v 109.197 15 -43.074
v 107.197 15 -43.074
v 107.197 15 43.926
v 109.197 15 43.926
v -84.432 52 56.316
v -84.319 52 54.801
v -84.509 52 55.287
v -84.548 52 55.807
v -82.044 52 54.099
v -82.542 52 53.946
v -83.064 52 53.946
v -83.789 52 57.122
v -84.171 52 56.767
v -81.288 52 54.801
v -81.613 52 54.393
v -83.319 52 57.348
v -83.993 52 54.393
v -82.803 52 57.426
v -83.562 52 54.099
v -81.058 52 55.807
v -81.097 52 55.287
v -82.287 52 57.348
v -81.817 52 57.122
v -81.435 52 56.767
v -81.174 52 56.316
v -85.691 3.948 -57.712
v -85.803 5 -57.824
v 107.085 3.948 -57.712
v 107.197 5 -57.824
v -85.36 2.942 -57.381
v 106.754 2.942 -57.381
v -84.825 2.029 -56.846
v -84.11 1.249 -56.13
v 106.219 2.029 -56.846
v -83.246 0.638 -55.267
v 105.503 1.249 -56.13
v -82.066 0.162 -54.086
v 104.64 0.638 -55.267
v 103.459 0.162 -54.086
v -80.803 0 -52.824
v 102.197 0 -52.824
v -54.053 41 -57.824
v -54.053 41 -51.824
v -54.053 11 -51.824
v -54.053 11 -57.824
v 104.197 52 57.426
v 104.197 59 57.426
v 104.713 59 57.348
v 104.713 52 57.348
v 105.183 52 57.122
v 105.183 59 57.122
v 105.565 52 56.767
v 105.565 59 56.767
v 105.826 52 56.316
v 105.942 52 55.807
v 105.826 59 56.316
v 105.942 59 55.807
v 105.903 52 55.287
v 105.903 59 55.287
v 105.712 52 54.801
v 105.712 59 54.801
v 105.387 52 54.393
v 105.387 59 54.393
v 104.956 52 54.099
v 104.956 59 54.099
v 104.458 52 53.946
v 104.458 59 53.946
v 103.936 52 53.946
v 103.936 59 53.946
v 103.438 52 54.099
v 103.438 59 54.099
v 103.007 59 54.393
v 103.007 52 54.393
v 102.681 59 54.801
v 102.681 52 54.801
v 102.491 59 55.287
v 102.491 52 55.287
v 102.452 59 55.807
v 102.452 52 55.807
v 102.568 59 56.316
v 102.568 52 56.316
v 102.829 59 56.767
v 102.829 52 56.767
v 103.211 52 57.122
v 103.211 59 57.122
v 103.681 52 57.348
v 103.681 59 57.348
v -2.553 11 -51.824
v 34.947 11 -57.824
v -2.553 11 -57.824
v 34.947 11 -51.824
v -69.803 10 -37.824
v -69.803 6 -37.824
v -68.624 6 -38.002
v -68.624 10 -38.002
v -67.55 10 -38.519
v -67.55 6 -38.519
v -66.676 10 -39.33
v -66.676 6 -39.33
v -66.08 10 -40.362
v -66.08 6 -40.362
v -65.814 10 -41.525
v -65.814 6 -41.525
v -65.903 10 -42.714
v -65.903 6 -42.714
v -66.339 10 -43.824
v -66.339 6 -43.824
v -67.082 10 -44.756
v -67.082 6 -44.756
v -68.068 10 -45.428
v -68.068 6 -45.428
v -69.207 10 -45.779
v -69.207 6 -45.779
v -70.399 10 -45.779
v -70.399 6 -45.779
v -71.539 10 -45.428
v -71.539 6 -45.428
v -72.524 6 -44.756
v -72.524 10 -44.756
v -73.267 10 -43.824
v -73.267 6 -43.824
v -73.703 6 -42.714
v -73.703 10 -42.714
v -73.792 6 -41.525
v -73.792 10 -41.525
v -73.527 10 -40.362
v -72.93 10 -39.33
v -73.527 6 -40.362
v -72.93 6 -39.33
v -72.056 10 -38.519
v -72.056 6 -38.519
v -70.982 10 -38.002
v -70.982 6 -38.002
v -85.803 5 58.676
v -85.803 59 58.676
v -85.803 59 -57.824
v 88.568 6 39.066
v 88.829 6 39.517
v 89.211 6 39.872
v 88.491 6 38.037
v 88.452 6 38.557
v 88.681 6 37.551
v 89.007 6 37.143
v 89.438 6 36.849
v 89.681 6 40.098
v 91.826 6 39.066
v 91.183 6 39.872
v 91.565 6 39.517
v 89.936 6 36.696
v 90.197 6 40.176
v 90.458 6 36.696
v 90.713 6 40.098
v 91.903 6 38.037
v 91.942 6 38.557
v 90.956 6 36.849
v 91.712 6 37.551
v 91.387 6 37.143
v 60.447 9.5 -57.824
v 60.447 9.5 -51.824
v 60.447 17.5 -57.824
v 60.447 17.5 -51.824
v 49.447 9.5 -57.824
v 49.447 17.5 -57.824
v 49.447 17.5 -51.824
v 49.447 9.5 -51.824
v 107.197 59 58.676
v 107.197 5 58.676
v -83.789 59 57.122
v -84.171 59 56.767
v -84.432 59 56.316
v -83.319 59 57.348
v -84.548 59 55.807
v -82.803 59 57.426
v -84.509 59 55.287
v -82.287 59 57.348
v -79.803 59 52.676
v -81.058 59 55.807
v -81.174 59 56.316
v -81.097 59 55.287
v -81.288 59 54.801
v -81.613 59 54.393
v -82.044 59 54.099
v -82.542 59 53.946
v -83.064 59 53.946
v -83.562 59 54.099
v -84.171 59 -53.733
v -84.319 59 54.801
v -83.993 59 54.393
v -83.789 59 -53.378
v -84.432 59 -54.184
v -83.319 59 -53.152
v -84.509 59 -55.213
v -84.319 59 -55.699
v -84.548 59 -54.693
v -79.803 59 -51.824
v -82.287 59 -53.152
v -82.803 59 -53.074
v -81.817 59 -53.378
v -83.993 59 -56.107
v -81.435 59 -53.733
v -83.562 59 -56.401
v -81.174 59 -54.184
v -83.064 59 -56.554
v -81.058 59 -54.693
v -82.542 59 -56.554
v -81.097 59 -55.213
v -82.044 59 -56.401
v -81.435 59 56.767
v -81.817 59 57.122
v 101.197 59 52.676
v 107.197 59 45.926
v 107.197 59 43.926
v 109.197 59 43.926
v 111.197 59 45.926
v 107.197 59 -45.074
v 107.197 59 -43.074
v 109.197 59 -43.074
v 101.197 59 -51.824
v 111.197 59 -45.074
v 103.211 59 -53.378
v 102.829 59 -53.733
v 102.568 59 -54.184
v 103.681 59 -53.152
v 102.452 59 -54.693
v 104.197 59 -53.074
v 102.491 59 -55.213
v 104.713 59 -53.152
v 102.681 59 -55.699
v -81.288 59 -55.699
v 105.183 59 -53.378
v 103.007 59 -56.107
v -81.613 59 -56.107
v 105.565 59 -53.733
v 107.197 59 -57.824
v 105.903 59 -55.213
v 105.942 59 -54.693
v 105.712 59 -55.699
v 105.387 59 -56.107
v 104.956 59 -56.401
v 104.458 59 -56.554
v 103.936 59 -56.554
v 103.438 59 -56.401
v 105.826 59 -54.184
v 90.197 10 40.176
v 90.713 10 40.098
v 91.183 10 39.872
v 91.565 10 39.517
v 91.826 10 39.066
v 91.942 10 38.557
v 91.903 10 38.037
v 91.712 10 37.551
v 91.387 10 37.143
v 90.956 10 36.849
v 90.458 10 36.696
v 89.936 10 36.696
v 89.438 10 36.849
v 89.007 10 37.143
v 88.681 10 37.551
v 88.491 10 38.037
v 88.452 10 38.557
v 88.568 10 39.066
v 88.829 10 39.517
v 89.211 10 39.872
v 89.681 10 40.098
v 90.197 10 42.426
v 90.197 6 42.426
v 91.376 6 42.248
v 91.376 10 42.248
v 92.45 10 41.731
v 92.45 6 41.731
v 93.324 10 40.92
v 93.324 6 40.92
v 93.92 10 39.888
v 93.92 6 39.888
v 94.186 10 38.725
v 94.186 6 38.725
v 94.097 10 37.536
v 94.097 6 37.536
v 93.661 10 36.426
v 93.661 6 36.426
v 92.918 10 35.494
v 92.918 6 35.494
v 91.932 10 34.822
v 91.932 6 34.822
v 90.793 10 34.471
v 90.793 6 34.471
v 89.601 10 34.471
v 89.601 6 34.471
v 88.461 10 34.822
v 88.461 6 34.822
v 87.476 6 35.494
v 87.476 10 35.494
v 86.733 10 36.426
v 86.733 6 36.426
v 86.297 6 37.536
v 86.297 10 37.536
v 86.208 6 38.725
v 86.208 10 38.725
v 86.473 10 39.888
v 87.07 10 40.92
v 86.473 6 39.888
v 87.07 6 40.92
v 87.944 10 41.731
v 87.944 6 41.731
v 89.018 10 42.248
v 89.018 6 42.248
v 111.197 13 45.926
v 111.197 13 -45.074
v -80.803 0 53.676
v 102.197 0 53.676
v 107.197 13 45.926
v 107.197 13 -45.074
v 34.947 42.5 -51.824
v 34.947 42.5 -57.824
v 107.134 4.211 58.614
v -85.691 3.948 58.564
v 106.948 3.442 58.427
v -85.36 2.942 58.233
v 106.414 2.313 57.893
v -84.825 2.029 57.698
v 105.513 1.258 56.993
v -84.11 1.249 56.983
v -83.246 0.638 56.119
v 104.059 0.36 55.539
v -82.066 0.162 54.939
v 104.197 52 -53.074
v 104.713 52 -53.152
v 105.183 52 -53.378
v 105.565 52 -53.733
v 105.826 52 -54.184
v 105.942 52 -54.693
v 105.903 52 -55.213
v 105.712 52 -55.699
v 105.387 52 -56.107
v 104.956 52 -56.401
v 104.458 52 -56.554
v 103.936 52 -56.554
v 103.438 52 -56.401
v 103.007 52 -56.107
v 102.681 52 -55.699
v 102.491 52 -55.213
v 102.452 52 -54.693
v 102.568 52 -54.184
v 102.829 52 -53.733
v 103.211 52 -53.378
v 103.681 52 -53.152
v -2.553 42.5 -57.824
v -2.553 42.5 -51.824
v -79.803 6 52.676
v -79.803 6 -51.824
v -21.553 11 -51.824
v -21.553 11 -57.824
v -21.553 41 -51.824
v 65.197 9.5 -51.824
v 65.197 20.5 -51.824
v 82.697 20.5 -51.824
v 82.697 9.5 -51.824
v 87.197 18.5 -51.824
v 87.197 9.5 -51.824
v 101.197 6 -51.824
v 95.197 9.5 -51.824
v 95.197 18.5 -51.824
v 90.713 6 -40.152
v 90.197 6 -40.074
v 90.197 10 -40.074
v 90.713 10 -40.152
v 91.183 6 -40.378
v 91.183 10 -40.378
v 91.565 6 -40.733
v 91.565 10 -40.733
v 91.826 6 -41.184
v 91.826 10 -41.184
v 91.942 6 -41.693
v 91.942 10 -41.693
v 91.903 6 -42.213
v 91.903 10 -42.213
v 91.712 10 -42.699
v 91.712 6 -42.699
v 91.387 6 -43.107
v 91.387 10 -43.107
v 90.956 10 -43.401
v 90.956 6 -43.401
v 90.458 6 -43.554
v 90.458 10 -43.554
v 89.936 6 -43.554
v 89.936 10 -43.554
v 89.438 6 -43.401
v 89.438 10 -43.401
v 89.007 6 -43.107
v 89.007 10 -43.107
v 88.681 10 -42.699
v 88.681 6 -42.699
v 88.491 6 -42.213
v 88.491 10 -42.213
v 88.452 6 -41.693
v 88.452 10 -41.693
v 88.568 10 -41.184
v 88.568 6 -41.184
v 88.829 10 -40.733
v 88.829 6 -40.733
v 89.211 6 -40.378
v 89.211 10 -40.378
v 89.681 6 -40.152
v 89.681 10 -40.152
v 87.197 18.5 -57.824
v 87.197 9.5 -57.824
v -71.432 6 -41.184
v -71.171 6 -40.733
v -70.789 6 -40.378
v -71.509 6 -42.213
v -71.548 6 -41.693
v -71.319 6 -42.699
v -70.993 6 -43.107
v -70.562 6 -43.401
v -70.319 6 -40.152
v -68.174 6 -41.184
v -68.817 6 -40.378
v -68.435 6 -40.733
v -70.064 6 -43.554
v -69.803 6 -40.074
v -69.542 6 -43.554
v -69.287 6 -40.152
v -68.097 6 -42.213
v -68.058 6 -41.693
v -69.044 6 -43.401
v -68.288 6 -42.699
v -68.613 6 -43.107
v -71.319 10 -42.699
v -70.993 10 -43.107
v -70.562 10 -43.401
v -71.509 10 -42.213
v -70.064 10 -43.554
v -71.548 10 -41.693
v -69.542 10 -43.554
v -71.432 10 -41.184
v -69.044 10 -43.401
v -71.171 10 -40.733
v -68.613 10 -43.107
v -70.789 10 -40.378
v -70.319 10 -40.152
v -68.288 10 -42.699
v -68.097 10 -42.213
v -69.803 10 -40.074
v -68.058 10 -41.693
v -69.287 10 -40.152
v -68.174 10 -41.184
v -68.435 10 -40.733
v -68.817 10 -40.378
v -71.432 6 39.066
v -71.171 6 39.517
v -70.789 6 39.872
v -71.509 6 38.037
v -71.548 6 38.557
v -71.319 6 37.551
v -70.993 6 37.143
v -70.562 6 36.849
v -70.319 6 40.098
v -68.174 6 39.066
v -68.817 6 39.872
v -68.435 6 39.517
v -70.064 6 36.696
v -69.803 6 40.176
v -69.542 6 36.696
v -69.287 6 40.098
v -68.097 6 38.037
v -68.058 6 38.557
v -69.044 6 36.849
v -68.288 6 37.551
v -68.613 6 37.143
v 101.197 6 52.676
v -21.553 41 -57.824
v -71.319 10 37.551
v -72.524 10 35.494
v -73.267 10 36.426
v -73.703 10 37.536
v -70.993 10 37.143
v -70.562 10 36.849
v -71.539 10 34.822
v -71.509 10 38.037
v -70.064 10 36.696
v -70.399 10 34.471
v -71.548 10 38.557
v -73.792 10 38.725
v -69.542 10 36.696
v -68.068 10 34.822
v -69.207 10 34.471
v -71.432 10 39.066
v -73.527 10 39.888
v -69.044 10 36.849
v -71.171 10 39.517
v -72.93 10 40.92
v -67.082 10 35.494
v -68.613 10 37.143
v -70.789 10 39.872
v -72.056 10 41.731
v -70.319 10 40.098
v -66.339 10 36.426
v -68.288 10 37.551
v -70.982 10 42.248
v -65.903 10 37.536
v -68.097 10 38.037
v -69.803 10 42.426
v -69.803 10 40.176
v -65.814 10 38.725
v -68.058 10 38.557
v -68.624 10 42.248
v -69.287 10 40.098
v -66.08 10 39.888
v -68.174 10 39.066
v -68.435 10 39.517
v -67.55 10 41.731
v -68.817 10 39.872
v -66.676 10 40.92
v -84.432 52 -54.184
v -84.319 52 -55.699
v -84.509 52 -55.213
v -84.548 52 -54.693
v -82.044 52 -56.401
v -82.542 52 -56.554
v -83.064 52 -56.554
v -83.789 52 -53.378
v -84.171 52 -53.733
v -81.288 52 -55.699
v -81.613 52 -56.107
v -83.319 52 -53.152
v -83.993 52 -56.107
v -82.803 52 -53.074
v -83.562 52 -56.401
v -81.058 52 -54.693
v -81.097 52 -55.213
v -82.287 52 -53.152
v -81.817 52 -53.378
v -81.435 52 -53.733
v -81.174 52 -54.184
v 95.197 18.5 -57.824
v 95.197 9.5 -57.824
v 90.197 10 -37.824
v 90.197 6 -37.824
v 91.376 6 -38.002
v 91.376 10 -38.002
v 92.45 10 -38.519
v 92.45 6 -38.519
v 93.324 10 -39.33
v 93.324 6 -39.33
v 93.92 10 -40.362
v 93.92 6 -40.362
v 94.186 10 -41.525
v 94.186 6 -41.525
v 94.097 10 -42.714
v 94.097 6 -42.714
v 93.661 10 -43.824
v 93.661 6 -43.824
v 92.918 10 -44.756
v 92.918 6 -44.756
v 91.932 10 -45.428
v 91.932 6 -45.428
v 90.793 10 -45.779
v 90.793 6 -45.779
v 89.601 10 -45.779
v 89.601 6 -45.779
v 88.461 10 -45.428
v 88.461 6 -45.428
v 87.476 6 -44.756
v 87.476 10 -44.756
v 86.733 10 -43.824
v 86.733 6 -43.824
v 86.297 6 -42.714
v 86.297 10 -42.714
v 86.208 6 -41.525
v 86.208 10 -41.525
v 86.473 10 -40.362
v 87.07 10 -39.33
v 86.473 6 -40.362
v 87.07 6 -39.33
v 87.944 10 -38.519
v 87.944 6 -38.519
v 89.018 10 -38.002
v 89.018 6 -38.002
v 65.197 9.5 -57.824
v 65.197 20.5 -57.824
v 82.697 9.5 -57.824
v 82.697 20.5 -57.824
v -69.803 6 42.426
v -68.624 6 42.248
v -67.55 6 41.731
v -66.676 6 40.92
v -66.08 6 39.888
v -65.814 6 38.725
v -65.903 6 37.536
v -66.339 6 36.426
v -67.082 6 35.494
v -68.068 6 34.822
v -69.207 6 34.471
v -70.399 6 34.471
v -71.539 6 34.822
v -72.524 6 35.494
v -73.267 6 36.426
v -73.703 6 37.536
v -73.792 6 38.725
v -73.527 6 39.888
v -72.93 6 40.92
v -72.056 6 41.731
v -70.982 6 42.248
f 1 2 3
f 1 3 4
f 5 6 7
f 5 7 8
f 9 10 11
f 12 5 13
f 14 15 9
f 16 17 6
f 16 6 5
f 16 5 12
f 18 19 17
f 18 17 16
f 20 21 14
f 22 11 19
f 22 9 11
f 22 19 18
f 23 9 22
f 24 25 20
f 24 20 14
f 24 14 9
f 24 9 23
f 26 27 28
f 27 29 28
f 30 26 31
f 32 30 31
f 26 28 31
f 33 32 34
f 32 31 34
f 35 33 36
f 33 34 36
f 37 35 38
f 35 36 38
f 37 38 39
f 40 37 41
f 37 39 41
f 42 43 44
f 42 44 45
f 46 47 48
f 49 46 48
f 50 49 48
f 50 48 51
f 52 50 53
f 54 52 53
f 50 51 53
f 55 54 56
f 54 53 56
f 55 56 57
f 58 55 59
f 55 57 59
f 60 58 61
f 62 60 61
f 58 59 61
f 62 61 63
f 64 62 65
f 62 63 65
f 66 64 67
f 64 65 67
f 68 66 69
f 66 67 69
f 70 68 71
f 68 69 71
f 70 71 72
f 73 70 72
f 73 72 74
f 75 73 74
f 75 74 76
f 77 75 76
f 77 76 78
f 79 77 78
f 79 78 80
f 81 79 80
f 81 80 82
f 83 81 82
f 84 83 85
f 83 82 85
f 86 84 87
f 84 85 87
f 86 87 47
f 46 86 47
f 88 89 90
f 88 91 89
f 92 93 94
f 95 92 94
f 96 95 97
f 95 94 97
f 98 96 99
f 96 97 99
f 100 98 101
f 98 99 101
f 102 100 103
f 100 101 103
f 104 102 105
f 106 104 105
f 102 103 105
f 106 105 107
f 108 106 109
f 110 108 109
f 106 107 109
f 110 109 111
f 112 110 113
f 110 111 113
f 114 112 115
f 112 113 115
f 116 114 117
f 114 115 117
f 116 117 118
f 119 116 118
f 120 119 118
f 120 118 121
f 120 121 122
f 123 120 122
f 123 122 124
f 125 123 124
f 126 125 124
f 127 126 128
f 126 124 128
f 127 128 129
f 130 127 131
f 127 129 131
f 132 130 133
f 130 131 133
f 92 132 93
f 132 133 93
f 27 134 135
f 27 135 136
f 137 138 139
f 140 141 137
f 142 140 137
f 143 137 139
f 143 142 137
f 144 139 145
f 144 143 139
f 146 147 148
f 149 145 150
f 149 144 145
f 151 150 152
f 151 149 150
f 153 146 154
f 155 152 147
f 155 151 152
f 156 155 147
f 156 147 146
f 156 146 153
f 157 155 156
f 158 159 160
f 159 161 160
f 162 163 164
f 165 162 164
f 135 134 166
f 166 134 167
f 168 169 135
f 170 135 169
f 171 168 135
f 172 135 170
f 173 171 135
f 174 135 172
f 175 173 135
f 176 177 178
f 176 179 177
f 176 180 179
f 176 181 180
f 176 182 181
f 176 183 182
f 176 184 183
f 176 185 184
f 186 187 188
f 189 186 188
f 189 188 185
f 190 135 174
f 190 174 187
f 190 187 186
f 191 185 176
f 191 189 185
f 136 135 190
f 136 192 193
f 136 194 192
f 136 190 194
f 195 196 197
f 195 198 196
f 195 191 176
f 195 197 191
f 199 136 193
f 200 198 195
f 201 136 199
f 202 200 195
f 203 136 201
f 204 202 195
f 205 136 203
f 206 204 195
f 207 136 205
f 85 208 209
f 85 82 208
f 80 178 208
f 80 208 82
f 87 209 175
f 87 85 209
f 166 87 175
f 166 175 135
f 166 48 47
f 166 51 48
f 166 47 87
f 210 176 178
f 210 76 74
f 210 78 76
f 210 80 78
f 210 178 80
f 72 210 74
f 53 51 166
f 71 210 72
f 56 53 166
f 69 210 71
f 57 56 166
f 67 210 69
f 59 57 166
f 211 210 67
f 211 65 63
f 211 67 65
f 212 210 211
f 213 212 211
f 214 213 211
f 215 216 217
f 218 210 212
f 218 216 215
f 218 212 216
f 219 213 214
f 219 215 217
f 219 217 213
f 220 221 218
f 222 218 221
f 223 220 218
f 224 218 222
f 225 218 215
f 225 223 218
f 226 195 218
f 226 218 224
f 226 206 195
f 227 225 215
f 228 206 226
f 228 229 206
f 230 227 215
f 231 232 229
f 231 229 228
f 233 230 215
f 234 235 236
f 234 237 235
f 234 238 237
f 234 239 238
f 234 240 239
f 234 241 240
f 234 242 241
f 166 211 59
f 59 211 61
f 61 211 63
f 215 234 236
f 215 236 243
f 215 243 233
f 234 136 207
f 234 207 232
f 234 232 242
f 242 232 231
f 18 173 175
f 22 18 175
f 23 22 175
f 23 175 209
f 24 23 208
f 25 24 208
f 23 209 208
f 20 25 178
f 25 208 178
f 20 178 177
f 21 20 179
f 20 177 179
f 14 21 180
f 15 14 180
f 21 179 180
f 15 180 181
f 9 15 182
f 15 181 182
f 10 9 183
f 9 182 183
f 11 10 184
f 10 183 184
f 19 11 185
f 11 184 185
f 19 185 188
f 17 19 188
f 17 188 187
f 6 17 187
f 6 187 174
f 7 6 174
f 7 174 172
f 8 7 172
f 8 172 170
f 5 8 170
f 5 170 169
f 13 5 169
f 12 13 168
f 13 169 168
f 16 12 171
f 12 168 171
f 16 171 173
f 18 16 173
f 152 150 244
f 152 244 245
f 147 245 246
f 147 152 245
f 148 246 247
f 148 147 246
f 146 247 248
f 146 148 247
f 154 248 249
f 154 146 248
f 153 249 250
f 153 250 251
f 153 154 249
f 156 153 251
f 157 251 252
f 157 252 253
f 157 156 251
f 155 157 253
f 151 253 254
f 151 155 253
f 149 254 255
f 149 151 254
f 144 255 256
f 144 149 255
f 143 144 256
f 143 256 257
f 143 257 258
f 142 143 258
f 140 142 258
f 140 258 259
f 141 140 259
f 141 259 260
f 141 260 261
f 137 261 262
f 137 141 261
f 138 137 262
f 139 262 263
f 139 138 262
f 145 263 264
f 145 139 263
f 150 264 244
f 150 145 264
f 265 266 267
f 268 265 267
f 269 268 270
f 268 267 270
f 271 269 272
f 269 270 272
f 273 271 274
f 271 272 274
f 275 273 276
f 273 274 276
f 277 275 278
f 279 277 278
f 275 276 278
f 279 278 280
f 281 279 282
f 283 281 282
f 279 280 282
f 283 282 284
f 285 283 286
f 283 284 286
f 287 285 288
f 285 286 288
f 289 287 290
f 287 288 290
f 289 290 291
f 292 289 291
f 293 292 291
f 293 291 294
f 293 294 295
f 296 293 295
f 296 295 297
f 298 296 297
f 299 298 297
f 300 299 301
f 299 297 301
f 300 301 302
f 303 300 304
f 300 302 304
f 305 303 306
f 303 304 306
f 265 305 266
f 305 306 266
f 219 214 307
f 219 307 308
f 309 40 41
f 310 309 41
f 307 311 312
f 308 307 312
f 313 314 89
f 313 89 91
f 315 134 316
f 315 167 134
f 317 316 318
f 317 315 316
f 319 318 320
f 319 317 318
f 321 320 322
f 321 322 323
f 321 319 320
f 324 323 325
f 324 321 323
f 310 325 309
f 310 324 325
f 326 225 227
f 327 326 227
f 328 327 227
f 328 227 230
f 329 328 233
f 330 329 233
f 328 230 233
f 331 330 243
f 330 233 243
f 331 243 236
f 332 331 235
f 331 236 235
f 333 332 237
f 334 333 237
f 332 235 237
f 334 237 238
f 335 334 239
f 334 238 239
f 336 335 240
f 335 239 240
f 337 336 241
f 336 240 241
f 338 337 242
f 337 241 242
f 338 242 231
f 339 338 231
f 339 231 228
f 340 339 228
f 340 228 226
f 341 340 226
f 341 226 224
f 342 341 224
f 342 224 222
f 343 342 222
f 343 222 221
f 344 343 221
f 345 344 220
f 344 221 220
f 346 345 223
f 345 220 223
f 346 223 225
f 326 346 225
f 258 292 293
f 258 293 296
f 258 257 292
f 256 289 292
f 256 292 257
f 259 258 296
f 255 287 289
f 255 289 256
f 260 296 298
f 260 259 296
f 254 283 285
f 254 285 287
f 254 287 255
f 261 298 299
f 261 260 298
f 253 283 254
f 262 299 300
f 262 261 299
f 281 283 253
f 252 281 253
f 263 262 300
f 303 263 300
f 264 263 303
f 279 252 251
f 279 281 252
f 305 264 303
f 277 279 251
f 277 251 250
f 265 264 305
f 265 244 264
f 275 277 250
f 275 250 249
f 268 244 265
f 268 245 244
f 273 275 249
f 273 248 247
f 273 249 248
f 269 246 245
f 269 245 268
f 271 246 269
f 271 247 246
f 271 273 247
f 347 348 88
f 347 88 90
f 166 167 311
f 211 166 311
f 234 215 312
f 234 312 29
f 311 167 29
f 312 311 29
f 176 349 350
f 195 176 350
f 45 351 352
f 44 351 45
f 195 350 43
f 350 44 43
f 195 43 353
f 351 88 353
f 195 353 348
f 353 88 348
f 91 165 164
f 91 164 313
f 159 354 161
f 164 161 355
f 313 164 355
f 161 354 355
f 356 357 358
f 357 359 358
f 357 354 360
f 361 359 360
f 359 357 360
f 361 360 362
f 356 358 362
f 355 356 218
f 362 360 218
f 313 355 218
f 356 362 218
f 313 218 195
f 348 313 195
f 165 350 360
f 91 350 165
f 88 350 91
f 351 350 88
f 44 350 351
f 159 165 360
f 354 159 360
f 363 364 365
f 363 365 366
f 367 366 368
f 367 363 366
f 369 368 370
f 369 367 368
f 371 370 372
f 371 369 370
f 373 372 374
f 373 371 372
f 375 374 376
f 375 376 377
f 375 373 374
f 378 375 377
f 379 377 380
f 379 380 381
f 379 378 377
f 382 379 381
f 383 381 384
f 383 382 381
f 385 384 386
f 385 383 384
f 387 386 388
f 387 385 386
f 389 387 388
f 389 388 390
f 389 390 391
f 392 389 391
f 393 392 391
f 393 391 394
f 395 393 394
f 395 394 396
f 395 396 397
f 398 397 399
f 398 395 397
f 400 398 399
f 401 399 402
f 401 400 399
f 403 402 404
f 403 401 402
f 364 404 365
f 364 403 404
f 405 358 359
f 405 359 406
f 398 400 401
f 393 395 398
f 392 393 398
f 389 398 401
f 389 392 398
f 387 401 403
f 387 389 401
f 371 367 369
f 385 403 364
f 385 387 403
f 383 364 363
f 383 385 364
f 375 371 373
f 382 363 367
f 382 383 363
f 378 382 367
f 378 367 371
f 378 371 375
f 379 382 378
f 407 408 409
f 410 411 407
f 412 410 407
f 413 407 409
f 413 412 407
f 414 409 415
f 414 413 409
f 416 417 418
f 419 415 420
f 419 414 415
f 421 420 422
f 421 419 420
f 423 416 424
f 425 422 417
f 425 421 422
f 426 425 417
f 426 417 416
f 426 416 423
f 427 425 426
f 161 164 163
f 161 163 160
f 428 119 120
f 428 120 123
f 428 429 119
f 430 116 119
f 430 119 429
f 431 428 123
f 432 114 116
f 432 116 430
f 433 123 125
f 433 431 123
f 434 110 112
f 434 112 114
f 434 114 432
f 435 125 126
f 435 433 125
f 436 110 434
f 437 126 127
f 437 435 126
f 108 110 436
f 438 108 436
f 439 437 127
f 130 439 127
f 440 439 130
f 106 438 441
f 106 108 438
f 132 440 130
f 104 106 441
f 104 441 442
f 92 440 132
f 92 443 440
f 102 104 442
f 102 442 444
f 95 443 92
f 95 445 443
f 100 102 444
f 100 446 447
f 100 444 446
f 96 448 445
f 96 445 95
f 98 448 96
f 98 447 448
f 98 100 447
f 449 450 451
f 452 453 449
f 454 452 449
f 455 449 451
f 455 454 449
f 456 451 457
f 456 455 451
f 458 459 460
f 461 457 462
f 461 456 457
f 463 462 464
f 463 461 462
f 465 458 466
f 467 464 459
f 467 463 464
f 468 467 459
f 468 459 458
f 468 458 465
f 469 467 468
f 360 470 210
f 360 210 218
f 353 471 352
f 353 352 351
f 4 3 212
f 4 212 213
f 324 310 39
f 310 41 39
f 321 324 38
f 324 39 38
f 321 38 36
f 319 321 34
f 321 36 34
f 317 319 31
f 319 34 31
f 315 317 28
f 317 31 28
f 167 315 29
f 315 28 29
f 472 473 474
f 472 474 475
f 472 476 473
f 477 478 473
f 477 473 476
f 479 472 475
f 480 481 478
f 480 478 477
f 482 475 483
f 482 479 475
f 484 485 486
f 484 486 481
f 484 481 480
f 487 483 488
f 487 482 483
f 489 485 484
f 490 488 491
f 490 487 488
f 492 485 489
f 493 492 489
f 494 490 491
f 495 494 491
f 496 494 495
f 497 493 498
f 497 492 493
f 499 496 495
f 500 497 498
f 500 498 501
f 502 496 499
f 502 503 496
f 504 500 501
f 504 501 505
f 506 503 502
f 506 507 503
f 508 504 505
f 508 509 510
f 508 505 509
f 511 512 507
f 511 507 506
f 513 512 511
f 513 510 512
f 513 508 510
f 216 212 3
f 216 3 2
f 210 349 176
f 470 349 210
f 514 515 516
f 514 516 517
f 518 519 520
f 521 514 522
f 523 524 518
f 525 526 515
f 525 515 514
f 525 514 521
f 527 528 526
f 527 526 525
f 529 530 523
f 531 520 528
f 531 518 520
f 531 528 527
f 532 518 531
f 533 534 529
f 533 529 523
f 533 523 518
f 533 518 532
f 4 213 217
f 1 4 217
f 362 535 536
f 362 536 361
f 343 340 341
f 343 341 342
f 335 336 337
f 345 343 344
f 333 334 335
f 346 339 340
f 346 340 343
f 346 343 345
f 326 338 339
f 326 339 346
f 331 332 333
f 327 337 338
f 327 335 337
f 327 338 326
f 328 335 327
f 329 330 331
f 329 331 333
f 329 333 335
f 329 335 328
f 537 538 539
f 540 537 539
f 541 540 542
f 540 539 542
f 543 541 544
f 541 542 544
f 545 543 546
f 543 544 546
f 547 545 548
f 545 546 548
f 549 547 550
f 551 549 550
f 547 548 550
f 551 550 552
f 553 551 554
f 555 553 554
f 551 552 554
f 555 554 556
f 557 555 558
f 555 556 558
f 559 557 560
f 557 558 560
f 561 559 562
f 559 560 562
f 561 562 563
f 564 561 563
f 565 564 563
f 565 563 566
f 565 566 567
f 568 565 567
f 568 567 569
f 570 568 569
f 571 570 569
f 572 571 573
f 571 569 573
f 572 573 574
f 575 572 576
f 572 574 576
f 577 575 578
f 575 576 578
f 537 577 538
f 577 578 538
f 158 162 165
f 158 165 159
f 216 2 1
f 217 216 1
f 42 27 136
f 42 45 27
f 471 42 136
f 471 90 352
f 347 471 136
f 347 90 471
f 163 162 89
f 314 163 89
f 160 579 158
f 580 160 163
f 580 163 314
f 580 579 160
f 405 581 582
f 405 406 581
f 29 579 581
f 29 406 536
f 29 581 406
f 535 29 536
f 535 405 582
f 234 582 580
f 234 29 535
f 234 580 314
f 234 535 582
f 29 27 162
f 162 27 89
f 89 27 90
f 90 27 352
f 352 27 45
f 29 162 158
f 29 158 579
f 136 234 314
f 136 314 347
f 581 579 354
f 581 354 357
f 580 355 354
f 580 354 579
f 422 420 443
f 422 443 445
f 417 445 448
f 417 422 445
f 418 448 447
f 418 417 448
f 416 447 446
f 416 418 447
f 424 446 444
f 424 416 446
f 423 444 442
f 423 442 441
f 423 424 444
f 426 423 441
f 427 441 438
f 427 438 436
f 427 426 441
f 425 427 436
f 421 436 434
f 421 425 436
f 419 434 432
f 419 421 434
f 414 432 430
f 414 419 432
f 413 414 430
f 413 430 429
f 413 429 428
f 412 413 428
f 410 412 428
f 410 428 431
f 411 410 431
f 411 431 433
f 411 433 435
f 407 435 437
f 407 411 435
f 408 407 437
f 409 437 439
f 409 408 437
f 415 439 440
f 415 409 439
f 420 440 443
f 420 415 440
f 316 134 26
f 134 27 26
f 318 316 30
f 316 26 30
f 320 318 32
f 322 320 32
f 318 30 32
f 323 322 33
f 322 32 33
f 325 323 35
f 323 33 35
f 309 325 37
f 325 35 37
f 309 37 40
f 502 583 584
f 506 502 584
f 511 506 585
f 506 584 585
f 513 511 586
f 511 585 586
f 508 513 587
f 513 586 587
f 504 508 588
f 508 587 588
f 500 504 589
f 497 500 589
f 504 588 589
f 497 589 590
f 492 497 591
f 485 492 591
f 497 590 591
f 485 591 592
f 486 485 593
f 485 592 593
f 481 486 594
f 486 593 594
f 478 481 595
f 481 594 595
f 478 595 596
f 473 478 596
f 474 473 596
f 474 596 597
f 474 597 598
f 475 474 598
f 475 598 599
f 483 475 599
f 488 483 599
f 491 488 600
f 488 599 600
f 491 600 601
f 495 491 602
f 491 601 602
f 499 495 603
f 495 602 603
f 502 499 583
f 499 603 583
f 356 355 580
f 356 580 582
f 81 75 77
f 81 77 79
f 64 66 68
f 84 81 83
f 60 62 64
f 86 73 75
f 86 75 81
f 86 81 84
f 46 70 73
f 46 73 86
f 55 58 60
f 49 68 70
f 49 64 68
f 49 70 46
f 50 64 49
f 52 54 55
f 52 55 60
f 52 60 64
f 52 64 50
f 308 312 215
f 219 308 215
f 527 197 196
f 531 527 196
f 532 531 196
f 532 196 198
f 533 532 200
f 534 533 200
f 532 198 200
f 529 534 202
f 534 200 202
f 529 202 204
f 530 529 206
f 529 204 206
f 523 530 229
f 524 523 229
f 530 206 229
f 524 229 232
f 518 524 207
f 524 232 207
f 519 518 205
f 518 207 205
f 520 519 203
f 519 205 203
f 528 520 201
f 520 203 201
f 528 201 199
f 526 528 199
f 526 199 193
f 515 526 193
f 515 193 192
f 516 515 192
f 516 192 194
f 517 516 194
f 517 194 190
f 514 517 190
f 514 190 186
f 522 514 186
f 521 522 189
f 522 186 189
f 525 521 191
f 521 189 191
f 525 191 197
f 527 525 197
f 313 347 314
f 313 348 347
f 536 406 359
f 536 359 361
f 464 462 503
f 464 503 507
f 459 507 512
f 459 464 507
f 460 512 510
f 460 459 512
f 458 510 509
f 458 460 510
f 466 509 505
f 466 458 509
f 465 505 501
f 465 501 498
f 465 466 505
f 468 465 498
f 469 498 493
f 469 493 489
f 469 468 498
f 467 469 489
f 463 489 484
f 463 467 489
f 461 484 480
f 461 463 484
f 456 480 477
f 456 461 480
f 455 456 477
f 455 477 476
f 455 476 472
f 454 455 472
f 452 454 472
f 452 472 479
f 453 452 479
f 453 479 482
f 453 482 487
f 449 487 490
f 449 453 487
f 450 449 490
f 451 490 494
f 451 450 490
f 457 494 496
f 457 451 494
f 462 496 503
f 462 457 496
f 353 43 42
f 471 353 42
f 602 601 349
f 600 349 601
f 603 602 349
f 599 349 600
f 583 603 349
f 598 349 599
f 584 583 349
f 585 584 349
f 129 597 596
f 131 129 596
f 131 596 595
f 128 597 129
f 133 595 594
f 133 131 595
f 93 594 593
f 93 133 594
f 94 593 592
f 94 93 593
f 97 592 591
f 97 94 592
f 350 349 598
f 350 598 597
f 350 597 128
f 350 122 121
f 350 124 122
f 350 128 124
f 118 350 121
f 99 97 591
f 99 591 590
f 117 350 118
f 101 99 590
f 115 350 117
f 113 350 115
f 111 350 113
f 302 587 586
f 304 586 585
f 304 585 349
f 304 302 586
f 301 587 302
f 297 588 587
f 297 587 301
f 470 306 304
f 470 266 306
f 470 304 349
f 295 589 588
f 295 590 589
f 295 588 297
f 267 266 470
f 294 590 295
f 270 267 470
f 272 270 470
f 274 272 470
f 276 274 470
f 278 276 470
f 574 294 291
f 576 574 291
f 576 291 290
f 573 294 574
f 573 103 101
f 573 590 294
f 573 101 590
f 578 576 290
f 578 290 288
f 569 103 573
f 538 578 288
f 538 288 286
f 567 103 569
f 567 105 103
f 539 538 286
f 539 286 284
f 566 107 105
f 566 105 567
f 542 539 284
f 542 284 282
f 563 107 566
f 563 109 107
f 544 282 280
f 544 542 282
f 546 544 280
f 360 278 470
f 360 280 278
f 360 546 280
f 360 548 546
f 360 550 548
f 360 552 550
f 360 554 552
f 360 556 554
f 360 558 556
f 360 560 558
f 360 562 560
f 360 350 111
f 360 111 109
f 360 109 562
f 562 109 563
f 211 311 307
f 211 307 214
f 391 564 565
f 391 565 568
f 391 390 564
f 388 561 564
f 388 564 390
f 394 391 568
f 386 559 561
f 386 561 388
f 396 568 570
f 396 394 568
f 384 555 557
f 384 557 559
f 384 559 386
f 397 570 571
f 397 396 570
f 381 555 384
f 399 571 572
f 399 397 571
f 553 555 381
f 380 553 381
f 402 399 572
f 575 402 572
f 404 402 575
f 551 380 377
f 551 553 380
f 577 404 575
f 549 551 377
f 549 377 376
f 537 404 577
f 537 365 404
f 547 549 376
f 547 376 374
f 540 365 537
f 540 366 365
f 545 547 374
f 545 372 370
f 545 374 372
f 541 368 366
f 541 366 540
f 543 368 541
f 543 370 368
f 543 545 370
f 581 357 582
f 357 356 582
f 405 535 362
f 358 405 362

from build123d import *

# Parameters (mm, degrees)
SKETCH1_W               = 193
SKETCH1_H               = 116.5
BOSS_EXTRUDE5_DEPTH     = 59
SHELL4_T                = -6
SKETCH6_R               = 4
SKETCH6_R_2             = 1.75
BOSS_EXTRUDE6_DEPTH     = 4
CUT_EXTRUDE1_DEPTH      = 38
CUT_EXTRUDE1_DEPTH_BACK = 34
SKETCH9_R               = 1.75
CUT_EXTRUDE2_DEPTH      = 7
FILLET2_R               = 5
SKETCH12_W              = 6
SKETCH12_H              = 6.5
BOSS_EXTRUDE7_DEPTH     = 18
SKETCH15_W              = 6
SKETCH15_H              = 7.5
BOSS_EXTRUDE8_DEPTH     = 5
SKETCH16_W              = 7.5
SKETCH16_H              = 6
SKETCH16_W_2            = 6.75
SKETCH16_W_3            = 3.5
BOSS_EXTRUDE9_DEPTH     = 7.5
SKETCH17_W              = 6
SKETCH17_H              = 31.5
BOSS_EXTRUDE10_DEPTH    = 4
SKETCH18_W              = 6
SKETCH18_H              = 1.5
BOSS_EXTRUDE11_DEPTH    = 1.5
SKETCH19_W              = 2
SKETCH19_H              = 6
BOSS_EXTRUDE12_DEPTH    = 30
SKETCH20_W              = 9
SKETCH20_H              = 2.5
BOSS_EXTRUDE13_DEPTH    = 6
SKETCH21_W              = 6
SKETCH21_H              = 7.5
CUT_EXTRUDE3_DEPTH      = 3
SKETCH22_W              = 17.5
SKETCH22_H              = 6
CUT_EXTRUDE4_DEPTH      = 2
SKETCH23_W              = 6
SKETCH23_H              = 5
CUT_EXTRUDE5_DEPTH      = 2
SKETCH24_W              = 11
SKETCH24_H              = 6
CUT_EXTRUDE6_DEPTH      = 1.5
SKETCH25_W              = 11
SKETCH25_H              = 6
CUT_EXTRUDE7_DEPTH      = 1.5
SKETCH27_W              = 17.5
SKETCH27_H              = 6
CUT_EXTRUDE8_DEPTH      = 1.5
SKETCH32_W              = 91
SKETCH32_H              = 46
BOSS_EXTRUDE15_DEPTH    = 4
SKETCH33_W              = 2
SKETCH33_H              = 87
CUT_EXTRUDE10_DEPTH     = 44
SKETCH34_W              = 8
SKETCH34_H              = 6
CUT_EXTRUDE11_DEPTH     = 1.5
SKETCH35_W              = 6
SKETCH35_H              = 30
BOSS_EXTRUDE16_DEPTH    = 11
SKETCH36_W              = 6
SKETCH36_H              = 30
BOSS_EXTRUDE17_DEPTH    = 7
SKETCH37_W              = 6
SKETCH37_H              = 31.5
BOSS_EXTRUDE18_DEPTH    = 6
SKETCH38_W              = 6
SKETCH38_H              = 31.5
BOSS_EXTRUDE19_DEPTH    = 7


with BuildPart() as part:
    # Sketch1 → Boss-Extrude5 (new body)
    with BuildSketch(Plane(origin=(0, 0, 0), x_dir=(1, 0, 0), z_dir=(0, 1, 0))):
        with Locations((10.696891192, -0.426165803)):
            Rectangle(SKETCH1_W, SKETCH1_H)
    extrude(amount=BOSS_EXTRUDE5_DEPTH)

    # Shell4
    shell4_openings = [part.faces().sort_by_distance(p)[0] for p in [
        (10.696891192, 59, 0.426165803),
    ]]
    offset(amount=SHELL4_T, openings=shell4_openings, kind=Kind.INTERSECTION)

    # Sketch6 → Boss-Extrude6 (add)
    # profile 1 of 4: a face of its own
    with BuildSketch(Plane(origin=(0, 6, 0), x_dir=(1, 0, 0), z_dir=(0, 1, 0))):
        with Locations(Location((-69.803108808, 41.823834197, 0), (0, 0, 270))):
            Circle(SKETCH6_R)
        with Locations(Location((-69.803108808, 41.823834197, 0), (0, 0, 270))):
            Circle(SKETCH6_R_2, mode=Mode.SUBTRACT)
    # profile 2 of 4: a face of its own
    with BuildSketch(Plane(origin=(0, 6, 0), x_dir=(1, 0, 0), z_dir=(0, 1, 0))):
        with Locations(Location((90.196891192, 41.823834197, 0), (0, 0, 270))):
            Circle(SKETCH6_R)
        with Locations(Location((90.196891192, 41.823834197, 0), (0, 0, 270))):
            Circle(SKETCH6_R_2, mode=Mode.SUBTRACT)
    # profile 3 of 4: a face of its own
    with BuildSketch(Plane(origin=(0, 6, 0), x_dir=(1, 0, 0), z_dir=(0, 1, 0))):
        with Locations(Location((90.196891192, -38.426165803, 0), (0, 0, 270))):
            Circle(SKETCH6_R)
        with Locations(Location((90.196891192, -38.426165803, 0), (0, 0, 270))):
            Circle(SKETCH6_R_2, mode=Mode.SUBTRACT)
    # profile 4 of 4: a face of its own
    with BuildSketch(Plane(origin=(0, 6, 0), x_dir=(1, 0, 0), z_dir=(0, 1, 0))):
        with Locations(Location((-69.803108808, -38.426165803, 0), (0, 0, 270))):
            Circle(SKETCH6_R)
        with Locations(Location((-69.803108808, -38.426165803, 0), (0, 0, 270))):
            Circle(SKETCH6_R_2, mode=Mode.SUBTRACT)
    extrude(amount=BOSS_EXTRUDE6_DEPTH)

    # Sketch8 → Cut-Extrude1 (cut, two sides: drawn at the far end of the back side and taken through both)
    with BuildSketch(Plane(origin=(0, 0, -57.823834197), x_dir=(-1, 0, 0), z_dir=(0, 0, -1)).offset(-CUT_EXTRUDE1_DEPTH_BACK)):
        Polygon((-85.946891192, 18.5), (-100.196891192, 18.5), (-100.196891192, 11), (-85.946891192, 11), (-63.946891192, 11), (-45.946891192, 11), (10.053108808, 11), (61.053108808, 11), (61.053108808, 41), (10.053108808, 41), (10.053108808, 42.5), (-45.946891192, 42.5), (-45.946891192, 25), (-63.946891192, 25), (-63.946891192, 18.5), align=None)
    extrude(amount=CUT_EXTRUDE1_DEPTH + CUT_EXTRUDE1_DEPTH_BACK, mode=Mode.SUBTRACT)

    # Sketch9 → Cut-Extrude2 (cut)
    with BuildSketch(Plane(origin=(0, 59, 0), x_dir=(1, 0, 0), z_dir=(0, 1, 0))):
        with Locations(Location((-82.803108808, 54.823834197, 0), (0, 0, 270))):
            Circle(SKETCH9_R)
        with Locations(Location((104.196891192, 54.823834197, 0), (0, 0, 270))):
            Circle(SKETCH9_R)
        with Locations(Location((-82.803108808, -55.676165803, 0), (0, 0, 270))):
            Circle(SKETCH9_R)
        with Locations(Location((104.196891192, -55.676165803, 0), (0, 0, 270))):
            Circle(SKETCH9_R)
    extrude(amount=-CUT_EXTRUDE2_DEPTH, mode=Mode.SUBTRACT)

    # Fillet2
    fillet2_edges = [part.edges().sort_by_distance(p)[0] for p in [
        (10.696891192, 0, -57.823834197),
        (107.196891192, 0, 0.426165803),
        (10.696891192, 0, 58.676165803),
        (-85.803108808, 0, 0.426165803),
    ]]
    fillet(fillet2_edges, radius=FILLET2_R)

    # Sketch12 → Boss-Extrude7 (add)
    with BuildSketch(Plane.ZY.offset(-63.946891192)):
        with Locations((-54.823834197, 21.75)):
            Rectangle(SKETCH12_W, SKETCH12_H)
    extrude(amount=BOSS_EXTRUDE7_DEPTH)

    # Sketch15 → Boss-Extrude8 (add)
    with BuildSketch(Plane.ZY.offset(-100.196891192)):
        with Locations((-54.823834197, 14.75)):
            Rectangle(SKETCH15_W, SKETCH15_H)
    extrude(amount=BOSS_EXTRUDE8_DEPTH)

    # Sketch16 → Boss-Extrude9 (add)
    with BuildSketch(Plane.XZ.offset(-18.5)):
        with Locations((83.446891192, -54.823834197)):
            Rectangle(SKETCH16_W, SKETCH16_H)
        with Locations((61.821891192, -54.823834197)):
            Rectangle(SKETCH16_W_2, SKETCH16_H)
        with Locations((47.696891192, -54.823834197)):
            Rectangle(SKETCH16_W_3, SKETCH16_H)
    extrude(amount=BOSS_EXTRUDE9_DEPTH)

    # Sketch17 → Boss-Extrude10 (add)
    with BuildSketch(Plane.ZY.offset(-45.946891192)):
        with Locations((-54.823834197, 26.75)):
            Rectangle(SKETCH17_W, SKETCH17_H)
    extrude(amount=BOSS_EXTRUDE10_DEPTH)

    # Sketch18 → Boss-Extrude11 (add)
    with BuildSketch(Plane(origin=(-10.053108808, 0, 0), x_dir=(0, 0, -1), z_dir=(1, 0, 0))):
        with Locations((54.823834197, 41.75)):
            Rectangle(SKETCH18_W, SKETCH18_H)
    extrude(amount=BOSS_EXTRUDE11_DEPTH)

    # Sketch19 → Boss-Extrude12 (add)
    with BuildSketch(Plane.XZ.offset(-41)):
        with Locations((-9.553108808, -54.823834197)):
            Rectangle(SKETCH19_W, SKETCH19_H)
    extrude(amount=BOSS_EXTRUDE12_DEPTH)

    # Sketch20 → Boss-Extrude13 (add)
    with BuildSketch(Plane(origin=(0, 0, -57.823834197), x_dir=(-1, 0, 0), z_dir=(0, 0, -1))):
        with Locations((-53.946891192, 17.25)):
            Rectangle(SKETCH20_W, SKETCH20_H)
    extrude(amount=-BOSS_EXTRUDE13_DEPTH)

    # Sketch21 → Cut-Extrude3 (cut)
    with BuildSketch(Plane.ZY.offset(-79.696891192)):
        with Locations((-54.823834197, 14.75)):
            Rectangle(SKETCH21_W, SKETCH21_H)
    extrude(amount=-CUT_EXTRUDE3_DEPTH, mode=Mode.SUBTRACT)

    # Sketch22 → Cut-Extrude4 (cut)
    with BuildSketch(Plane.XZ.offset(-18.5)):
        with Locations((73.946891192, -54.823834197)):
            Rectangle(SKETCH22_W, SKETCH22_H)
    extrude(amount=-CUT_EXTRUDE4_DEPTH, mode=Mode.SUBTRACT)

    # Sketch23 → Cut-Extrude5 (cut)
    with BuildSketch(Plane.ZY.offset(-58.446891192)):
        with Locations((-54.823834197, 13.5)):
            Rectangle(SKETCH23_W, SKETCH23_H)
    extrude(amount=-CUT_EXTRUDE5_DEPTH, mode=Mode.SUBTRACT)

    # Sketch24 → Cut-Extrude6 (cut)
    with BuildSketch(Plane.XZ.offset(-16)):
        with Locations((54.946891192, -54.823834197)):
            Rectangle(SKETCH24_W, SKETCH24_H)
    extrude(amount=-CUT_EXTRUDE6_DEPTH, mode=Mode.SUBTRACT)

    # Sketch25 → Cut-Extrude7 (cut)
    with BuildSketch(Plane(origin=(0, 11, 0), x_dir=(1, 0, 0), z_dir=(0, 1, 0))):
        with Locations((54.946891192, 54.823834197)):
            Rectangle(SKETCH25_W, SKETCH25_H)
    extrude(amount=-CUT_EXTRUDE7_DEPTH, mode=Mode.SUBTRACT)

    # Sketch27 → Cut-Extrude8 (cut)
    with BuildSketch(Plane(origin=(0, 11, 0), x_dir=(1, 0, 0), z_dir=(0, 1, 0))):
        with Locations((73.946891192, 54.823834197)):
            Rectangle(SKETCH27_W, SKETCH27_H)
    extrude(amount=-CUT_EXTRUDE8_DEPTH, mode=Mode.SUBTRACT)

    # Sketch32 → Boss-Extrude15 (add)
    with BuildSketch(Plane(origin=(107.196891192, 0, 0), x_dir=(0, 0, -1), z_dir=(1, 0, 0))):
        with Locations((-0.426165803, 36)):
            Rectangle(SKETCH32_W, SKETCH32_H)
    extrude(amount=BOSS_EXTRUDE15_DEPTH)

    # Sketch33 → Cut-Extrude10 (cut)
    with BuildSketch(Plane(origin=(0, 59, 0), x_dir=(1, 0, 0), z_dir=(0, 1, 0))):
        with Locations((108.196891192, -0.426165803)):
            Rectangle(SKETCH33_W, SKETCH33_H)
    extrude(amount=-CUT_EXTRUDE10_DEPTH, mode=Mode.SUBTRACT)

    # Sketch34 → Cut-Extrude11 (cut)
    with BuildSketch(Plane(origin=(0, 11, 0), x_dir=(1, 0, 0), z_dir=(0, 1, 0))):
        with Locations((91.196891192, 54.823834197)):
            Rectangle(SKETCH34_W, SKETCH34_H)
    extrude(amount=-CUT_EXTRUDE11_DEPTH, mode=Mode.SUBTRACT)

    # Sketch35 → Boss-Extrude16 (add)
    with BuildSketch(Plane.ZY.offset(10.553108808)):
        with Locations((-54.823834197, 26)):
            Rectangle(SKETCH35_W, SKETCH35_H)
    extrude(amount=BOSS_EXTRUDE16_DEPTH)

    # Sketch36 → Boss-Extrude17 (add)
    with BuildSketch(Plane(origin=(-61.053108808, 0, 0), x_dir=(0, 0, -1), z_dir=(1, 0, 0))):
        with Locations((54.823834197, 26)):
            Rectangle(SKETCH36_W, SKETCH36_H)
    extrude(amount=BOSS_EXTRUDE17_DEPTH)

    # Sketch37 → Boss-Extrude18 (add)
    with BuildSketch(Plane(origin=(-8.553108808, 0, 0), x_dir=(0, 0, -1), z_dir=(1, 0, 0))):
        with Locations((54.823834197, 26.75)):
            Rectangle(SKETCH37_W, SKETCH37_H)
    extrude(amount=BOSS_EXTRUDE18_DEPTH)

    # Sketch38 → Boss-Extrude19 (add)
    with BuildSketch(Plane.ZY.offset(-41.946891192)):
        with Locations((-54.823834197, 26.75)):
            Rectangle(SKETCH38_W, SKETCH38_H)
    extrude(amount=BOSS_EXTRUDE19_DEPTH)


solid = part.part
